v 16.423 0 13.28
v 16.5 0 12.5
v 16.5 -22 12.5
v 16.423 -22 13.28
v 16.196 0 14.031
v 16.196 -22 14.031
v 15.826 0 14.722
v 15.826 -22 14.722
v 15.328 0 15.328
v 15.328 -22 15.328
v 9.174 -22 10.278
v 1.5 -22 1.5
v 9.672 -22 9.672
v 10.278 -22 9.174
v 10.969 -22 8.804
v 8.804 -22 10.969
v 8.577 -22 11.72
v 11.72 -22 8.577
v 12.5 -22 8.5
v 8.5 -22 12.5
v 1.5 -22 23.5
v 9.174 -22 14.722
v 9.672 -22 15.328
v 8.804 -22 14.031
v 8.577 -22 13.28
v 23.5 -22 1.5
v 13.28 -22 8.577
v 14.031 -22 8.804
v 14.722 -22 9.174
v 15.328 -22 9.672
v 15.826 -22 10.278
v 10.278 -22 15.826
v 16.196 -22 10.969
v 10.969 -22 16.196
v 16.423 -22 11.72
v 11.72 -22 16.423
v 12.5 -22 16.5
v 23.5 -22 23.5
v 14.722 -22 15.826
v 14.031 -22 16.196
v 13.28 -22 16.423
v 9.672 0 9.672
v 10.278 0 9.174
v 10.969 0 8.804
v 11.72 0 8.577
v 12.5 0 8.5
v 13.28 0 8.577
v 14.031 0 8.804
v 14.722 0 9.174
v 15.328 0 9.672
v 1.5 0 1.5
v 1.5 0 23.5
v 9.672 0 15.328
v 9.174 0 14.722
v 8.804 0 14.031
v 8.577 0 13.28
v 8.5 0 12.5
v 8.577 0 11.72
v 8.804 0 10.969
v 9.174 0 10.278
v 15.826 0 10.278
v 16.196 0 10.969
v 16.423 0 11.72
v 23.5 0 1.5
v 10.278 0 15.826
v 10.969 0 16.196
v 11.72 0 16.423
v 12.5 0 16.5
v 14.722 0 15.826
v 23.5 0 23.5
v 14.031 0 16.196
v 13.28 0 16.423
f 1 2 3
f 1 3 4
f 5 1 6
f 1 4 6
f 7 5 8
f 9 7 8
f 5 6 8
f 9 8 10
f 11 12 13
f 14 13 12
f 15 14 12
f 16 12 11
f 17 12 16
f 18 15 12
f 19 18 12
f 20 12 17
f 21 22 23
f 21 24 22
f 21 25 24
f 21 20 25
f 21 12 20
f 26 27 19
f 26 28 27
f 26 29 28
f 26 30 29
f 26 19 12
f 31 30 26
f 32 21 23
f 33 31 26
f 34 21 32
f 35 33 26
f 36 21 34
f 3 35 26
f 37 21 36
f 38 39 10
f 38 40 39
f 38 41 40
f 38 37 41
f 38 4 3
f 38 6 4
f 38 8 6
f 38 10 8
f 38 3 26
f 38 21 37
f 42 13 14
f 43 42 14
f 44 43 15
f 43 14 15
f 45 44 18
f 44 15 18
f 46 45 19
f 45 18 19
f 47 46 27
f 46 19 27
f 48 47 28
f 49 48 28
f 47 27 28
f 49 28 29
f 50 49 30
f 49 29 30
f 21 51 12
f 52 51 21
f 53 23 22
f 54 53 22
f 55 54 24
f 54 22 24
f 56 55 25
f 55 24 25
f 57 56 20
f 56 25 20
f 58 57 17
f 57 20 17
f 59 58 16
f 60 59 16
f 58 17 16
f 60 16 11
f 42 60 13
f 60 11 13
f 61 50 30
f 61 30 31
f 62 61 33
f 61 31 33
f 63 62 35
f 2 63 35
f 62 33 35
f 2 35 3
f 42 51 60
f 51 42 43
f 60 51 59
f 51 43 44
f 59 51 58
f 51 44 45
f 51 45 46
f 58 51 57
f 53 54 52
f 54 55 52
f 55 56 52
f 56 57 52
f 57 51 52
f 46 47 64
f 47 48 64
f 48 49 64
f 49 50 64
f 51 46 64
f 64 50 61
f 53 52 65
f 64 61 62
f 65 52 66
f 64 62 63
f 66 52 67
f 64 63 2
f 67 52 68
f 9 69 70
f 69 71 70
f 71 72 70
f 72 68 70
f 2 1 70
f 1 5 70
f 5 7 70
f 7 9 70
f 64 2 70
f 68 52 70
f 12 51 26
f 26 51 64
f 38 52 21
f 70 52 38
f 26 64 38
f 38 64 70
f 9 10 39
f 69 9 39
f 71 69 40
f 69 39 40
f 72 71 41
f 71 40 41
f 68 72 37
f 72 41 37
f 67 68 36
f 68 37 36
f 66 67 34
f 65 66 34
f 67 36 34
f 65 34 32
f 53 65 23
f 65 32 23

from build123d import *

# Parameters (mm, degrees)
F0_W     = 22
F0_H     = 22
F1_DEPTH = 22
F5_DEPTH = 22.001


with BuildPart() as f1:
    # F0 (on Front) → F1 (new body)
    with BuildSketch(Plane.XZ):
        with Locations((12.5, 12.5)):
            Rectangle(F0_W, F0_H)
    extrude(amount=F1_DEPTH)

    # F2 (on face) → F5 (cut, through all)
    with BuildSketch(Plane.XZ.offset(22)):
        with BuildLine():
            Line((15.3284271247, 15.3284271247), (12.5, 12.5))
            Line((12.5, 12.5), (15.3284271247, 9.6715728753))
            ThreePointArc((15.3284271247, 9.6715728753), (16.19551813, 10.9692662705), (16.5, 12.5))
            ThreePointArc((16.5, 12.5), (16.19551813, 14.0307337295), (15.3284271247, 15.3284271247))
        make_face()
        with BuildLine():
            ThreePointArc((15.3284271247, 15.3284271247), (12.5, 16.5), (9.6715728753, 15.3284271247))
            Line((9.6715728753, 15.3284271247), (12.5, 12.5))
            Line((12.5, 12.5), (15.3284271247, 15.3284271247))
        make_face()
        with BuildLine():
            Line((12.5, 12.5), (9.6715728753, 15.3284271247))
            ThreePointArc((9.6715728753, 15.3284271247), (8.5, 12.5), (9.6715728753, 9.6715728753))
            Line((9.6715728753, 9.6715728753), (12.5, 12.5))
        make_face()
        with BuildLine():
            Line((15.3284271247, 9.6715728753), (12.5, 12.5))
            Line((12.5, 12.5), (9.6715728753, 9.6715728753))
            ThreePointArc((9.6715728753, 9.6715728753), (12.5, 8.5), (15.3284271247, 9.6715728753))
        make_face()
    extrude(amount=-F5_DEPTH, mode=Mode.SUBTRACT)


solid = f1.part
